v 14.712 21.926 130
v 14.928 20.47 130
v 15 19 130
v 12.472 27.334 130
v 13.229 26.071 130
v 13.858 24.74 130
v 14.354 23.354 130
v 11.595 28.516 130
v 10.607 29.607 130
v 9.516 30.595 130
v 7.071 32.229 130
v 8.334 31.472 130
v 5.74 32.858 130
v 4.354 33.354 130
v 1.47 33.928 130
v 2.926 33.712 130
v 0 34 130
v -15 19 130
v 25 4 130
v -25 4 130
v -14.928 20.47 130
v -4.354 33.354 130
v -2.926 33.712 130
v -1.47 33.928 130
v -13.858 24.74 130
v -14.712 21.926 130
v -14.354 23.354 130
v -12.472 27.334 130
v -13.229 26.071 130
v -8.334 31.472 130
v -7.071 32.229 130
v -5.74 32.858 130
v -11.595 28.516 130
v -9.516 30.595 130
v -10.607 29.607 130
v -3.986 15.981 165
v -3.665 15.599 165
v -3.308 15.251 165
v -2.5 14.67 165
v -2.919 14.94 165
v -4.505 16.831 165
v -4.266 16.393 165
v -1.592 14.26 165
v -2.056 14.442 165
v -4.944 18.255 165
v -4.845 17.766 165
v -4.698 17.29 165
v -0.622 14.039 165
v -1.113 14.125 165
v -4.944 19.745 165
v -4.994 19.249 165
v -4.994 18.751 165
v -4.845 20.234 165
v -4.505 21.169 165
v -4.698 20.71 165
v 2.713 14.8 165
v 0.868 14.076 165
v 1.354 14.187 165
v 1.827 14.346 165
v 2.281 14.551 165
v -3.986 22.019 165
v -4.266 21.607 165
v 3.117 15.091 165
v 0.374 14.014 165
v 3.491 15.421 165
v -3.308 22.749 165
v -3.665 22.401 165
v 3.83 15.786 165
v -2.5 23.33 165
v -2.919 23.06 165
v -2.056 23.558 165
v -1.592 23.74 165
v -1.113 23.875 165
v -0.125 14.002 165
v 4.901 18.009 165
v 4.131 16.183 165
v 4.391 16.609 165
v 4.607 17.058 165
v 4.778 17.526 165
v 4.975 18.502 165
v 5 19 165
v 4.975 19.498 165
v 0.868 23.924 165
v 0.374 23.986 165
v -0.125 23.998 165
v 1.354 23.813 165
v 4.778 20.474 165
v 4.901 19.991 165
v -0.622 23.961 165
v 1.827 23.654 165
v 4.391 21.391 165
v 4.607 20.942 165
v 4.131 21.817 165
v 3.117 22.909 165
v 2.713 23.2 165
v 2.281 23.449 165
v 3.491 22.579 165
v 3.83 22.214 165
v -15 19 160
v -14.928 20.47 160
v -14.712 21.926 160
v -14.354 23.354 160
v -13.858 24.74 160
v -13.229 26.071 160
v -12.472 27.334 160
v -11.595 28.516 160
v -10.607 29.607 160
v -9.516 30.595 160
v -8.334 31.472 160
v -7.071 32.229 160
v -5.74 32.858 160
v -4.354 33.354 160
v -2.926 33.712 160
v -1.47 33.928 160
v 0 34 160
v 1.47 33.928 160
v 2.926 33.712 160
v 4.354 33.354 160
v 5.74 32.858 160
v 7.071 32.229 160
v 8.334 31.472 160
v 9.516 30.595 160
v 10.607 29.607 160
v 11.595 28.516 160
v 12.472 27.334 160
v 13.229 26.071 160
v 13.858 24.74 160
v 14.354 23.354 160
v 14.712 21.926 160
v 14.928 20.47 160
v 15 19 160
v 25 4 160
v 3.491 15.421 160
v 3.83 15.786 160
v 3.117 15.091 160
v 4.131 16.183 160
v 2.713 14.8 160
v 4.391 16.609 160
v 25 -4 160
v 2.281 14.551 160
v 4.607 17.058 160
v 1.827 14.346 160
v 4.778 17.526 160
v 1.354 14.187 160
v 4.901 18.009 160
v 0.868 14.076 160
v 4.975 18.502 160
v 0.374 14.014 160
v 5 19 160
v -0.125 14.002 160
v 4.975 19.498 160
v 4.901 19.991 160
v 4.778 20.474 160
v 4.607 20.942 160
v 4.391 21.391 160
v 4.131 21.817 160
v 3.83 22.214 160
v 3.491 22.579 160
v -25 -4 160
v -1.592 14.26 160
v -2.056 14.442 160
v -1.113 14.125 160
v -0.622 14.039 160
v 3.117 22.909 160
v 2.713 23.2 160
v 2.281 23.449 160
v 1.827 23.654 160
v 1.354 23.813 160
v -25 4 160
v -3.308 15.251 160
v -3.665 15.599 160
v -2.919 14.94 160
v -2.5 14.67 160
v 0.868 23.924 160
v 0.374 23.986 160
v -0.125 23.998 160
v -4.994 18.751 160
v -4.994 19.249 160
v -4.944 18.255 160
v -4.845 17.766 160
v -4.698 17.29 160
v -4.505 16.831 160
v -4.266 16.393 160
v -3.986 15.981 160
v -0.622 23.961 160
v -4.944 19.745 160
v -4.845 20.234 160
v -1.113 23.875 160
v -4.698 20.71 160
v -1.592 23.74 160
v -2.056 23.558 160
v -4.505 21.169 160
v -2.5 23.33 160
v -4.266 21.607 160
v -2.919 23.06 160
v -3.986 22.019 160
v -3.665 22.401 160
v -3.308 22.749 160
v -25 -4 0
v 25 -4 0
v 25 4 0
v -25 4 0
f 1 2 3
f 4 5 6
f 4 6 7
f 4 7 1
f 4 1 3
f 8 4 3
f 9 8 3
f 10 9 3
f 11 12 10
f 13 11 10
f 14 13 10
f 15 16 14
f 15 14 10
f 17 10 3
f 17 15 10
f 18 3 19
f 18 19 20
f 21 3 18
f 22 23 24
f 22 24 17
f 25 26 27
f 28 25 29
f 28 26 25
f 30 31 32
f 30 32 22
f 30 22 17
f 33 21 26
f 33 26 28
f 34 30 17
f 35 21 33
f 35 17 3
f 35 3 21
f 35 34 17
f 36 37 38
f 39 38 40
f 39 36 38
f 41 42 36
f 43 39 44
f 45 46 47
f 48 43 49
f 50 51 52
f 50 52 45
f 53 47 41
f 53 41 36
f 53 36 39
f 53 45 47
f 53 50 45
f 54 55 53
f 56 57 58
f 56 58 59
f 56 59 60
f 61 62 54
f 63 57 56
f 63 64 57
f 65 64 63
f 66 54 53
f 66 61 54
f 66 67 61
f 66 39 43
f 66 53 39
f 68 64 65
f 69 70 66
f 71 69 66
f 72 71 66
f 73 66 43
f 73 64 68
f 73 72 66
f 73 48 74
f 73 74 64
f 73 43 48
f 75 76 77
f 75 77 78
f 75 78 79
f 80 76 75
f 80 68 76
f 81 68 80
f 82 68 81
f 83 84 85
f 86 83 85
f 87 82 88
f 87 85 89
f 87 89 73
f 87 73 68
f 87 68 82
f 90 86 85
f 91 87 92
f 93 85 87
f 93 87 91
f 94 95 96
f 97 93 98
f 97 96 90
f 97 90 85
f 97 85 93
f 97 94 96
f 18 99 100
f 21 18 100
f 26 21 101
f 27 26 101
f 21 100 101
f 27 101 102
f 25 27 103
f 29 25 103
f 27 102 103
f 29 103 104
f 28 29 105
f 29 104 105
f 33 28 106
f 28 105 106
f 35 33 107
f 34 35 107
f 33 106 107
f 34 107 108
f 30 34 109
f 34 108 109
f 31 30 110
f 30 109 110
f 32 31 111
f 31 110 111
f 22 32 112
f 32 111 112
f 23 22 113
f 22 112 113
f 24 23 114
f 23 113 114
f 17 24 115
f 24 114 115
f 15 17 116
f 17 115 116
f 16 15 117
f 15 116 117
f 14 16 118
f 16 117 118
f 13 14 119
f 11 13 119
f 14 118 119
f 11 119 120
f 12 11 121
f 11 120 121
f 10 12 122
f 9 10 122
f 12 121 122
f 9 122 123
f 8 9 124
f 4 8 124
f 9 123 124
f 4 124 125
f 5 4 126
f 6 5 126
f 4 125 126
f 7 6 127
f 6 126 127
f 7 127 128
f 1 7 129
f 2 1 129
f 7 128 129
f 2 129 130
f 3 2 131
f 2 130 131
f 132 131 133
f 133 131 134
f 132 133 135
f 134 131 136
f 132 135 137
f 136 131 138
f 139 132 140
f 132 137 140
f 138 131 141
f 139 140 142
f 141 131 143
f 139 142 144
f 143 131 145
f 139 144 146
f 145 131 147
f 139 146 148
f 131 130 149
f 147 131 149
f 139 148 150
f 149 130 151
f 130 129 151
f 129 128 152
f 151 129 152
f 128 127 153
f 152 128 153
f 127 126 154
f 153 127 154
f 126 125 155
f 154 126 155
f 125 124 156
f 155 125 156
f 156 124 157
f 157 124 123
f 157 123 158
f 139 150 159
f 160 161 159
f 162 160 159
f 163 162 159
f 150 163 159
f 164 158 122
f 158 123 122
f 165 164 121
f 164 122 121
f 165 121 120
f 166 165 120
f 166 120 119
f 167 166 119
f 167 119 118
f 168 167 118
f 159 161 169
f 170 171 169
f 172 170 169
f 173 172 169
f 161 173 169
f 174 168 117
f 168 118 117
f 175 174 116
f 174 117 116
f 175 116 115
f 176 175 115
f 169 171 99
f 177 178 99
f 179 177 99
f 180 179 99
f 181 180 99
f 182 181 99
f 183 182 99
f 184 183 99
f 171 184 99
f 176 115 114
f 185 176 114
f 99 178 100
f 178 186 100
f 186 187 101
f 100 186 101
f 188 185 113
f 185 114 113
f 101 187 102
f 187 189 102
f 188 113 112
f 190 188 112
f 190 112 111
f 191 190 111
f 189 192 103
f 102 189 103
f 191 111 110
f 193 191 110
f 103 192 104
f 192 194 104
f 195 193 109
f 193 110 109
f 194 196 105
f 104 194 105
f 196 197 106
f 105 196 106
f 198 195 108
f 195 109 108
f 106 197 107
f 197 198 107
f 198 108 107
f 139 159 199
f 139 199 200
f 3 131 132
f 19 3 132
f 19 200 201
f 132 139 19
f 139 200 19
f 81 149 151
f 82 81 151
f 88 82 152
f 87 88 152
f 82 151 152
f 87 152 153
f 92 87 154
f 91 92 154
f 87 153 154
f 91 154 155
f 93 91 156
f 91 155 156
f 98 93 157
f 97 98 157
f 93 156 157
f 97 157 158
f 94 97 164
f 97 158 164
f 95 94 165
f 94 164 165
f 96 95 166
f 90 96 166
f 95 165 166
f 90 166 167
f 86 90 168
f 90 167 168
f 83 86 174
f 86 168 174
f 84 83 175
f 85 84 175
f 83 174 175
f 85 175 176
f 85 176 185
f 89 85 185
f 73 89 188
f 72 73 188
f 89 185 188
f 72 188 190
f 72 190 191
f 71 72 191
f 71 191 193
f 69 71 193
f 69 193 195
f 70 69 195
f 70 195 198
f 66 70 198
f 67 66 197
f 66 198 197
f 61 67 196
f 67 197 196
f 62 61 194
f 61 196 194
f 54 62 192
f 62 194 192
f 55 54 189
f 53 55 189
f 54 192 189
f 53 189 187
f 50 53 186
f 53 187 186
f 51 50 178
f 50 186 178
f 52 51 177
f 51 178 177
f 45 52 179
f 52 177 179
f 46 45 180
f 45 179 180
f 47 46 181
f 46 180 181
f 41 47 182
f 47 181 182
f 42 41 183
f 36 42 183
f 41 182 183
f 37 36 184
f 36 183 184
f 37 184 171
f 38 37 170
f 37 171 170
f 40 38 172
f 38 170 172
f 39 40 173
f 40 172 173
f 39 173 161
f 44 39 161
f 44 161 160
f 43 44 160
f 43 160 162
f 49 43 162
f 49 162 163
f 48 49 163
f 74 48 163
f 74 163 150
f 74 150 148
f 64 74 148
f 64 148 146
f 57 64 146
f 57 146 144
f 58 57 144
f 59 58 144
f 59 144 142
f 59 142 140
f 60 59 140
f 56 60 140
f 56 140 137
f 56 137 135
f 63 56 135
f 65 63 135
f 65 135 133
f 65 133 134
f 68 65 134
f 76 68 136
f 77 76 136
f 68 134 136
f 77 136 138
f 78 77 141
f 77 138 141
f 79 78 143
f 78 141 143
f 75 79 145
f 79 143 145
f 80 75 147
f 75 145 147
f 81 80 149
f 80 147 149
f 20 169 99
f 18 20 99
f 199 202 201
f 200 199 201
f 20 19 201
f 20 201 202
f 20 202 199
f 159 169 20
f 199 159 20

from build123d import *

# Parameters (mm, degrees)
SKETCH_1_W      = 50
SKETCH_1_H      = 8
EXTRUDE_2_DEPTH = 30
SKETCH_5_R      = 5
EXTRUDE_3_DEPTH = 5


with BuildPart() as part:
    # 扫描1: sweep along a path in 草图2
    with BuildLine(Plane(origin=(0, 0, 0), x_dir=(0, 0, -1), z_dir=(1, 0, 0))) as sweep_1_path:
        Line((0, 55.298323556), (-160, 55.298323556))
    # 草图1 → 扫描1 (sweep)
    with BuildSketch(Plane.XY):
        Rectangle(SKETCH_1_W, SKETCH_1_H)
    sweep(path=sweep_1_path.line)

    # 草图4 → 凸台-拉伸2 (add)
    with BuildSketch(Plane.XY.offset(160)):
        with BuildLine():
            Line((15, 19), (25, 4))
            Line((25, 4), (-25, 4))
            Line((-25, 4), (-15, 19))
            ThreePointArc((-15, 19), (0, 34), (15, 19))
        make_face()
    extrude(amount=-EXTRUDE_2_DEPTH)

    # 草图5 → 凸台-拉伸3 (add)
    with BuildSketch(Plane.XY.offset(160)):
        with Locations((0, 19)):
            Circle(SKETCH_5_R)
    extrude(amount=EXTRUDE_3_DEPTH)


solid = part.part
